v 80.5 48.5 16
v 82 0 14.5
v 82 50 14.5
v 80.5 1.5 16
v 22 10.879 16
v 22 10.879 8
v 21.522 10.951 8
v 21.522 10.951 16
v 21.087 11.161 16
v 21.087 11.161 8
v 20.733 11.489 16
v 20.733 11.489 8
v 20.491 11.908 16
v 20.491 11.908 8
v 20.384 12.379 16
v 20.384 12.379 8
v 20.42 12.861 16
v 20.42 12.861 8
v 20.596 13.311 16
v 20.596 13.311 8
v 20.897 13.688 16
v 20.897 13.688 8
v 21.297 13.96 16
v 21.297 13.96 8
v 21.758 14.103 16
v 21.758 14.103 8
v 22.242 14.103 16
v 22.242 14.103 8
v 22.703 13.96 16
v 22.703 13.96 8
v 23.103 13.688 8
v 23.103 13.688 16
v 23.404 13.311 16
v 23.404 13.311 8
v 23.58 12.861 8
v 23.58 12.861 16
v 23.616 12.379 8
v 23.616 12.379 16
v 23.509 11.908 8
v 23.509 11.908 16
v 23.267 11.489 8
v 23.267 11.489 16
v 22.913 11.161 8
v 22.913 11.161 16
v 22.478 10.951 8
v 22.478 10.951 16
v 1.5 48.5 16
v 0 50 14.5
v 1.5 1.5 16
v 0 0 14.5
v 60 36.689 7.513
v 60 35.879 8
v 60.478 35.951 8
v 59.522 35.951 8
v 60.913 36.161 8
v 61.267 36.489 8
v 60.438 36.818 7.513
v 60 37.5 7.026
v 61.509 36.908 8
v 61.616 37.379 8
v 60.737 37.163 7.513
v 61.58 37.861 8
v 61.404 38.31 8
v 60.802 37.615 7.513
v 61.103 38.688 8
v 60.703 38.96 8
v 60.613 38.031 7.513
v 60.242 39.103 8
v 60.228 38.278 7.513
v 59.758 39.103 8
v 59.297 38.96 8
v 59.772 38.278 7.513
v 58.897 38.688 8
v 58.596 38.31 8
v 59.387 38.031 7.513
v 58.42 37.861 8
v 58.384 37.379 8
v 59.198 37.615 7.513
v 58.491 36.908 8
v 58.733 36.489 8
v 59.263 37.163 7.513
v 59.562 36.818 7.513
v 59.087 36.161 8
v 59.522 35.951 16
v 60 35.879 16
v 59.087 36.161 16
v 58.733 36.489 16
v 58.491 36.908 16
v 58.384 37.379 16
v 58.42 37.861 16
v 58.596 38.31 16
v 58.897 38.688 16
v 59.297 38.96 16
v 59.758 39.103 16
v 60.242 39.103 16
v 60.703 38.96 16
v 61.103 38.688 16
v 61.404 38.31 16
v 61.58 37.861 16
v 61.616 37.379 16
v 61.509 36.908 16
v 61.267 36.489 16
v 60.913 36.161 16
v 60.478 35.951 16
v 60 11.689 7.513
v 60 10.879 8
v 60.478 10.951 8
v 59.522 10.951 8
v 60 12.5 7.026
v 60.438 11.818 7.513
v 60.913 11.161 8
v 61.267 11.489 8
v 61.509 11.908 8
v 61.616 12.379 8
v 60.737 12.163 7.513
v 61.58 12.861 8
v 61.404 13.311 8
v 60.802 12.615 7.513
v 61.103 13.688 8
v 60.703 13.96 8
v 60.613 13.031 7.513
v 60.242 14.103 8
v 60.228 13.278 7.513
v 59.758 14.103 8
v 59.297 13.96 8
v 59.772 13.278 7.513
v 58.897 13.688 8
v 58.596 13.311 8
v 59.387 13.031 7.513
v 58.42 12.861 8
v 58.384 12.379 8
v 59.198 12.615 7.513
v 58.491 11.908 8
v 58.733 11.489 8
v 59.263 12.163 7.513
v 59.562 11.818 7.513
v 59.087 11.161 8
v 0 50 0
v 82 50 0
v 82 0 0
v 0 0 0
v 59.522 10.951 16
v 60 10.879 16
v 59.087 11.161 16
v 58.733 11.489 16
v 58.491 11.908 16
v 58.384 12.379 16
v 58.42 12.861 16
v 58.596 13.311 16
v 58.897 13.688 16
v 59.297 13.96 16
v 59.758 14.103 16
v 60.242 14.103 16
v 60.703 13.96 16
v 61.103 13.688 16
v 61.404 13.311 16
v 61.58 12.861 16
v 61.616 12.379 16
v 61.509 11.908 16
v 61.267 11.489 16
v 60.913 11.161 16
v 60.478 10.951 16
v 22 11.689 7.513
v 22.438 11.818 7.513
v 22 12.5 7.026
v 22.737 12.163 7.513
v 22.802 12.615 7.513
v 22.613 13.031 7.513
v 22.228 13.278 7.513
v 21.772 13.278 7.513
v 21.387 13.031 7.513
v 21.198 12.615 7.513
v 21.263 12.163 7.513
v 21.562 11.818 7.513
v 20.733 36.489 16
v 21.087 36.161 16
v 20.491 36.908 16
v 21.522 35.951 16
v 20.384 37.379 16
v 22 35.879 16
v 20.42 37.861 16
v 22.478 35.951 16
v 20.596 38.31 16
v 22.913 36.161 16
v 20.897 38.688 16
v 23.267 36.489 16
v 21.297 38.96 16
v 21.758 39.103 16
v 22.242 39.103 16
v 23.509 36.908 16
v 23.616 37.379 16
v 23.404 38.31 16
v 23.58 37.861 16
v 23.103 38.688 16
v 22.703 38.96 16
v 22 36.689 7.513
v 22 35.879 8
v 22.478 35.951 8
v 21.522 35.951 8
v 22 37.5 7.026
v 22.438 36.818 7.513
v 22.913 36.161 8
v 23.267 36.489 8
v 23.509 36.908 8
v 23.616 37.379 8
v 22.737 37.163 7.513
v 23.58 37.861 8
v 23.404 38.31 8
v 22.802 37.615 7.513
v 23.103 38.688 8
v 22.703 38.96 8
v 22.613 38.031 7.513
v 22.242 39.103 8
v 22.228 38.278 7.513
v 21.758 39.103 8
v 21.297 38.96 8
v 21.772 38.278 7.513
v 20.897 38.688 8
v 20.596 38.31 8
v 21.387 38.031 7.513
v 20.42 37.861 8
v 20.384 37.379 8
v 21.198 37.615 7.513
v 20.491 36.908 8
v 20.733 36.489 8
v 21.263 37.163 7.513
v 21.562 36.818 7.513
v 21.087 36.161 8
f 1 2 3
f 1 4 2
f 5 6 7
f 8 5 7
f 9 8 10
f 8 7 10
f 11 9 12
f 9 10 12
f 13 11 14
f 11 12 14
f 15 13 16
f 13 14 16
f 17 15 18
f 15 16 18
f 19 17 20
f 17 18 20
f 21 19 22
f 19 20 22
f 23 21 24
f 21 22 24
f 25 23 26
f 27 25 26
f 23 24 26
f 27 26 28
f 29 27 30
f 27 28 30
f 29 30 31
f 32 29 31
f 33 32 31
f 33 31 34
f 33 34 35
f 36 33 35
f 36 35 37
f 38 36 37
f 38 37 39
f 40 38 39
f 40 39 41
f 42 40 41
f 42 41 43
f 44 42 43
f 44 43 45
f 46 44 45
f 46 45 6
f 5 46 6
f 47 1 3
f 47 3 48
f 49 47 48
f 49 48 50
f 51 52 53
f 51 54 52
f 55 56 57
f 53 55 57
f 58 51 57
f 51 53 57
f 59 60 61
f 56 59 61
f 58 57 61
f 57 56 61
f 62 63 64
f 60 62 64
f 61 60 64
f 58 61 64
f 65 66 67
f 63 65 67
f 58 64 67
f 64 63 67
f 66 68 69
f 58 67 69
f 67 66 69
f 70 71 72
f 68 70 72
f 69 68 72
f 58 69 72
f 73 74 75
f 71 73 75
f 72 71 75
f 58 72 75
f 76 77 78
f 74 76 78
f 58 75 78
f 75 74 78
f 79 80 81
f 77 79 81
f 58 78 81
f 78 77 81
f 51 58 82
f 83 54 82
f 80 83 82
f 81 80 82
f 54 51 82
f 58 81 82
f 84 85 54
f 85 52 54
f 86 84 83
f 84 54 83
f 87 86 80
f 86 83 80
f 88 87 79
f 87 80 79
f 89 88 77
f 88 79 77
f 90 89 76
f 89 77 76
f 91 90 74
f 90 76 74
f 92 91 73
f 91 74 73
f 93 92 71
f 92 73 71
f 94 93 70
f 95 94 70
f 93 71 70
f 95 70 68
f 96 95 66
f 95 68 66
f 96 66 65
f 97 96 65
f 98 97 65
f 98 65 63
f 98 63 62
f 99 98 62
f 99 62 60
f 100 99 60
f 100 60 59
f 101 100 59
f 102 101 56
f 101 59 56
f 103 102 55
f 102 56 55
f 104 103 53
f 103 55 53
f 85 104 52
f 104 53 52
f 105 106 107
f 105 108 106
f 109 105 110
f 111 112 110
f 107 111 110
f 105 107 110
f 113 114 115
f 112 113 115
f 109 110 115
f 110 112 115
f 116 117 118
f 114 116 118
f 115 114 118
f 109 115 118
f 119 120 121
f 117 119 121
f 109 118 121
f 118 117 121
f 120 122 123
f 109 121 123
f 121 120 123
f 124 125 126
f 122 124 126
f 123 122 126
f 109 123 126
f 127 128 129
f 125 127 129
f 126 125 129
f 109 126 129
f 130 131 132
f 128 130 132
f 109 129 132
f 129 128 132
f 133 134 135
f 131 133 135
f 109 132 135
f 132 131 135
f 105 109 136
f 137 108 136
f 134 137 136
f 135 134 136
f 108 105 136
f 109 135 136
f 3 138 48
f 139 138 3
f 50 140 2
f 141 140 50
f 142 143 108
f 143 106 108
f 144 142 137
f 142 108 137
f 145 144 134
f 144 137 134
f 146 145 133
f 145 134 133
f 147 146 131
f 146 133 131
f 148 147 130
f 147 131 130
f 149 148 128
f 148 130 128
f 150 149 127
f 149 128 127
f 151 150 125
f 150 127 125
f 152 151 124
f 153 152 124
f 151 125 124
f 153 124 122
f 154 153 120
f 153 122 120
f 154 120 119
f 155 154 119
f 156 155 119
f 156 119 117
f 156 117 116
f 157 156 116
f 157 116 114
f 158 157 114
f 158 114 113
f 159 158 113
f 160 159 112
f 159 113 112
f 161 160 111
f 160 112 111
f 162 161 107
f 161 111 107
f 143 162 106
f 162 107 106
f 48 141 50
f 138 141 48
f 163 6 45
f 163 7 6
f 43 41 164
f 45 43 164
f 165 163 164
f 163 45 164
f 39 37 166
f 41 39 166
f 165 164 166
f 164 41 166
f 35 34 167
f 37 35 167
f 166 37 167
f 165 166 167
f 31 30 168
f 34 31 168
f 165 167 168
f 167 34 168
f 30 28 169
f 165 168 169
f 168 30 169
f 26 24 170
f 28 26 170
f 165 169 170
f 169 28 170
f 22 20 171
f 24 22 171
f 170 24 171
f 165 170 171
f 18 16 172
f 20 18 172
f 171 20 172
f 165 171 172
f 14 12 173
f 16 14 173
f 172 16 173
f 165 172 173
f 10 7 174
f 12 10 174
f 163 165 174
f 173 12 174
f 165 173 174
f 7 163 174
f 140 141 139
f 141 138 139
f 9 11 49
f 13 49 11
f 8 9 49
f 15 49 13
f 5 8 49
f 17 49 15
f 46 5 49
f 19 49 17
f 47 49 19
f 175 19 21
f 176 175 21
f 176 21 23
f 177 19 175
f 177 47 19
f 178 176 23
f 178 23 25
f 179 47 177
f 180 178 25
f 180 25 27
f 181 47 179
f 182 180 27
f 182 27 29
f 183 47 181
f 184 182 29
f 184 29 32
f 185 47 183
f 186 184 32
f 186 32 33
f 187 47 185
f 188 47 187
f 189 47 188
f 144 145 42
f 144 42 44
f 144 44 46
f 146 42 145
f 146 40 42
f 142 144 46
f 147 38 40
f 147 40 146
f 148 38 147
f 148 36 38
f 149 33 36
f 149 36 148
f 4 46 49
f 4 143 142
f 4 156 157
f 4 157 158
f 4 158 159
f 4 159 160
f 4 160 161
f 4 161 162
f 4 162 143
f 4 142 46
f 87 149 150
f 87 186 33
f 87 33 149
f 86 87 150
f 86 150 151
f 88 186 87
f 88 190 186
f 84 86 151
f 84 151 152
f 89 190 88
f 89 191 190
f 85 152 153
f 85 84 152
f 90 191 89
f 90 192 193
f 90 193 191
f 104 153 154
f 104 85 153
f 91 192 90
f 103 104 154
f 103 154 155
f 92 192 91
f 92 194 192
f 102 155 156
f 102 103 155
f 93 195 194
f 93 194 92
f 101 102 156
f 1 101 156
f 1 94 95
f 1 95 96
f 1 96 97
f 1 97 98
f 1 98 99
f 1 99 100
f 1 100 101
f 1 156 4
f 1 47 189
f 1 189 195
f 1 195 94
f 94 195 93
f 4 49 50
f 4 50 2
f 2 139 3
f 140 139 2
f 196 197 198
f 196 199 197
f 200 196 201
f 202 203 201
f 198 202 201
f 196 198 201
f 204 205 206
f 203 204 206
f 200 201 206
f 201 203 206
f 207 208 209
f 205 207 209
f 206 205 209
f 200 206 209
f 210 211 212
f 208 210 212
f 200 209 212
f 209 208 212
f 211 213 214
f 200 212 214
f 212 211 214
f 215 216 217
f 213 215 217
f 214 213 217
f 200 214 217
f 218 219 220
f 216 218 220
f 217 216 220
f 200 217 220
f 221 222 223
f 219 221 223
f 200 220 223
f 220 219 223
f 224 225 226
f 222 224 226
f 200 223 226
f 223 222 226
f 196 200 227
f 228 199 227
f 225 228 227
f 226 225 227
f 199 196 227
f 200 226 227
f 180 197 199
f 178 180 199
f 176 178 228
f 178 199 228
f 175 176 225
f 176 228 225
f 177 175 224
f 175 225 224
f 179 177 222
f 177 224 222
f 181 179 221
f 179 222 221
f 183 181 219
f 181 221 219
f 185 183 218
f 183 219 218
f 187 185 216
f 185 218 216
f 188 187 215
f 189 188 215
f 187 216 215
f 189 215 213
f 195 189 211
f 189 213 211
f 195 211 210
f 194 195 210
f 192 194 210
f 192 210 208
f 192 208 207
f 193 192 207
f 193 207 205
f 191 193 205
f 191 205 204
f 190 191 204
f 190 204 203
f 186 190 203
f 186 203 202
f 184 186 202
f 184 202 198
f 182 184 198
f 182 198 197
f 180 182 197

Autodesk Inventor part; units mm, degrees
ref_plane "YZ Plane" through (0, 0, 0) normal (1, 0, 0) x (0, 1, 0)
ref_plane "XZ Plane" through (0, 0, 0) normal (0, 1, 0) x (-1, 0, 0)
ref_plane "XY Plane" through (0, 0, 0) normal (0, 0, 1) x (1, 0, 0)
sketch "Skizze1" plane through (0, 0, 0) normal (0, 0, 1) x (1, 0, 0)
  line L0 (0, 50) -> (82, 50)
  line L1 (82, 50) -> (82, 0)
  line L2 (82, 0) -> (0, 0)
  line L3 (0, 0) -> (0, 50)
  dimension "d0" = 50
  dimension "d1" = 82
extrude "Extrusion1" add sketch "Skizze1" along normal blind 16
chamfer "Fasen1" distance 1.5 angle 45 4 edges at (41, 50, 16) (82, 25, 16) (41, 0, 16) (0, 25, 16)
sketch "Skizze2" plane through (0, 0, 16) normal (0, 0, 1) x (1, 0, 0)
  line L0 (82, 50) -> (0, 50) projected
  line L1 (41, 50) -> (41, 0) construction
  line L2 (0, 0) -> (82, 0) projected
  line L3 (0, 50) -> (0, 0) projected
  line L4 (0, 25) -> (82.1323, 25) construction
  point P0 (60, 37.5)
  point P1 (60, 12.5)
  point P2 (22, 37.5)
  point P3 (22, 12.5)
  dimension "d7" = 25
  dimension "d8" = 38
hole "Bohrung1" at (60, 37.5, 16) at (60, 12.5, 16) at (22, 37.5, 16) at (22, 12.5, 16) direction (0, 0, -1) diameter 3.242 depth 8 tip angle 118 thread size "M4x0.7" class "6H" standard "ISO Metric profile"
properties part number "Grundplatte" material "Stahl, galvanisiert"
